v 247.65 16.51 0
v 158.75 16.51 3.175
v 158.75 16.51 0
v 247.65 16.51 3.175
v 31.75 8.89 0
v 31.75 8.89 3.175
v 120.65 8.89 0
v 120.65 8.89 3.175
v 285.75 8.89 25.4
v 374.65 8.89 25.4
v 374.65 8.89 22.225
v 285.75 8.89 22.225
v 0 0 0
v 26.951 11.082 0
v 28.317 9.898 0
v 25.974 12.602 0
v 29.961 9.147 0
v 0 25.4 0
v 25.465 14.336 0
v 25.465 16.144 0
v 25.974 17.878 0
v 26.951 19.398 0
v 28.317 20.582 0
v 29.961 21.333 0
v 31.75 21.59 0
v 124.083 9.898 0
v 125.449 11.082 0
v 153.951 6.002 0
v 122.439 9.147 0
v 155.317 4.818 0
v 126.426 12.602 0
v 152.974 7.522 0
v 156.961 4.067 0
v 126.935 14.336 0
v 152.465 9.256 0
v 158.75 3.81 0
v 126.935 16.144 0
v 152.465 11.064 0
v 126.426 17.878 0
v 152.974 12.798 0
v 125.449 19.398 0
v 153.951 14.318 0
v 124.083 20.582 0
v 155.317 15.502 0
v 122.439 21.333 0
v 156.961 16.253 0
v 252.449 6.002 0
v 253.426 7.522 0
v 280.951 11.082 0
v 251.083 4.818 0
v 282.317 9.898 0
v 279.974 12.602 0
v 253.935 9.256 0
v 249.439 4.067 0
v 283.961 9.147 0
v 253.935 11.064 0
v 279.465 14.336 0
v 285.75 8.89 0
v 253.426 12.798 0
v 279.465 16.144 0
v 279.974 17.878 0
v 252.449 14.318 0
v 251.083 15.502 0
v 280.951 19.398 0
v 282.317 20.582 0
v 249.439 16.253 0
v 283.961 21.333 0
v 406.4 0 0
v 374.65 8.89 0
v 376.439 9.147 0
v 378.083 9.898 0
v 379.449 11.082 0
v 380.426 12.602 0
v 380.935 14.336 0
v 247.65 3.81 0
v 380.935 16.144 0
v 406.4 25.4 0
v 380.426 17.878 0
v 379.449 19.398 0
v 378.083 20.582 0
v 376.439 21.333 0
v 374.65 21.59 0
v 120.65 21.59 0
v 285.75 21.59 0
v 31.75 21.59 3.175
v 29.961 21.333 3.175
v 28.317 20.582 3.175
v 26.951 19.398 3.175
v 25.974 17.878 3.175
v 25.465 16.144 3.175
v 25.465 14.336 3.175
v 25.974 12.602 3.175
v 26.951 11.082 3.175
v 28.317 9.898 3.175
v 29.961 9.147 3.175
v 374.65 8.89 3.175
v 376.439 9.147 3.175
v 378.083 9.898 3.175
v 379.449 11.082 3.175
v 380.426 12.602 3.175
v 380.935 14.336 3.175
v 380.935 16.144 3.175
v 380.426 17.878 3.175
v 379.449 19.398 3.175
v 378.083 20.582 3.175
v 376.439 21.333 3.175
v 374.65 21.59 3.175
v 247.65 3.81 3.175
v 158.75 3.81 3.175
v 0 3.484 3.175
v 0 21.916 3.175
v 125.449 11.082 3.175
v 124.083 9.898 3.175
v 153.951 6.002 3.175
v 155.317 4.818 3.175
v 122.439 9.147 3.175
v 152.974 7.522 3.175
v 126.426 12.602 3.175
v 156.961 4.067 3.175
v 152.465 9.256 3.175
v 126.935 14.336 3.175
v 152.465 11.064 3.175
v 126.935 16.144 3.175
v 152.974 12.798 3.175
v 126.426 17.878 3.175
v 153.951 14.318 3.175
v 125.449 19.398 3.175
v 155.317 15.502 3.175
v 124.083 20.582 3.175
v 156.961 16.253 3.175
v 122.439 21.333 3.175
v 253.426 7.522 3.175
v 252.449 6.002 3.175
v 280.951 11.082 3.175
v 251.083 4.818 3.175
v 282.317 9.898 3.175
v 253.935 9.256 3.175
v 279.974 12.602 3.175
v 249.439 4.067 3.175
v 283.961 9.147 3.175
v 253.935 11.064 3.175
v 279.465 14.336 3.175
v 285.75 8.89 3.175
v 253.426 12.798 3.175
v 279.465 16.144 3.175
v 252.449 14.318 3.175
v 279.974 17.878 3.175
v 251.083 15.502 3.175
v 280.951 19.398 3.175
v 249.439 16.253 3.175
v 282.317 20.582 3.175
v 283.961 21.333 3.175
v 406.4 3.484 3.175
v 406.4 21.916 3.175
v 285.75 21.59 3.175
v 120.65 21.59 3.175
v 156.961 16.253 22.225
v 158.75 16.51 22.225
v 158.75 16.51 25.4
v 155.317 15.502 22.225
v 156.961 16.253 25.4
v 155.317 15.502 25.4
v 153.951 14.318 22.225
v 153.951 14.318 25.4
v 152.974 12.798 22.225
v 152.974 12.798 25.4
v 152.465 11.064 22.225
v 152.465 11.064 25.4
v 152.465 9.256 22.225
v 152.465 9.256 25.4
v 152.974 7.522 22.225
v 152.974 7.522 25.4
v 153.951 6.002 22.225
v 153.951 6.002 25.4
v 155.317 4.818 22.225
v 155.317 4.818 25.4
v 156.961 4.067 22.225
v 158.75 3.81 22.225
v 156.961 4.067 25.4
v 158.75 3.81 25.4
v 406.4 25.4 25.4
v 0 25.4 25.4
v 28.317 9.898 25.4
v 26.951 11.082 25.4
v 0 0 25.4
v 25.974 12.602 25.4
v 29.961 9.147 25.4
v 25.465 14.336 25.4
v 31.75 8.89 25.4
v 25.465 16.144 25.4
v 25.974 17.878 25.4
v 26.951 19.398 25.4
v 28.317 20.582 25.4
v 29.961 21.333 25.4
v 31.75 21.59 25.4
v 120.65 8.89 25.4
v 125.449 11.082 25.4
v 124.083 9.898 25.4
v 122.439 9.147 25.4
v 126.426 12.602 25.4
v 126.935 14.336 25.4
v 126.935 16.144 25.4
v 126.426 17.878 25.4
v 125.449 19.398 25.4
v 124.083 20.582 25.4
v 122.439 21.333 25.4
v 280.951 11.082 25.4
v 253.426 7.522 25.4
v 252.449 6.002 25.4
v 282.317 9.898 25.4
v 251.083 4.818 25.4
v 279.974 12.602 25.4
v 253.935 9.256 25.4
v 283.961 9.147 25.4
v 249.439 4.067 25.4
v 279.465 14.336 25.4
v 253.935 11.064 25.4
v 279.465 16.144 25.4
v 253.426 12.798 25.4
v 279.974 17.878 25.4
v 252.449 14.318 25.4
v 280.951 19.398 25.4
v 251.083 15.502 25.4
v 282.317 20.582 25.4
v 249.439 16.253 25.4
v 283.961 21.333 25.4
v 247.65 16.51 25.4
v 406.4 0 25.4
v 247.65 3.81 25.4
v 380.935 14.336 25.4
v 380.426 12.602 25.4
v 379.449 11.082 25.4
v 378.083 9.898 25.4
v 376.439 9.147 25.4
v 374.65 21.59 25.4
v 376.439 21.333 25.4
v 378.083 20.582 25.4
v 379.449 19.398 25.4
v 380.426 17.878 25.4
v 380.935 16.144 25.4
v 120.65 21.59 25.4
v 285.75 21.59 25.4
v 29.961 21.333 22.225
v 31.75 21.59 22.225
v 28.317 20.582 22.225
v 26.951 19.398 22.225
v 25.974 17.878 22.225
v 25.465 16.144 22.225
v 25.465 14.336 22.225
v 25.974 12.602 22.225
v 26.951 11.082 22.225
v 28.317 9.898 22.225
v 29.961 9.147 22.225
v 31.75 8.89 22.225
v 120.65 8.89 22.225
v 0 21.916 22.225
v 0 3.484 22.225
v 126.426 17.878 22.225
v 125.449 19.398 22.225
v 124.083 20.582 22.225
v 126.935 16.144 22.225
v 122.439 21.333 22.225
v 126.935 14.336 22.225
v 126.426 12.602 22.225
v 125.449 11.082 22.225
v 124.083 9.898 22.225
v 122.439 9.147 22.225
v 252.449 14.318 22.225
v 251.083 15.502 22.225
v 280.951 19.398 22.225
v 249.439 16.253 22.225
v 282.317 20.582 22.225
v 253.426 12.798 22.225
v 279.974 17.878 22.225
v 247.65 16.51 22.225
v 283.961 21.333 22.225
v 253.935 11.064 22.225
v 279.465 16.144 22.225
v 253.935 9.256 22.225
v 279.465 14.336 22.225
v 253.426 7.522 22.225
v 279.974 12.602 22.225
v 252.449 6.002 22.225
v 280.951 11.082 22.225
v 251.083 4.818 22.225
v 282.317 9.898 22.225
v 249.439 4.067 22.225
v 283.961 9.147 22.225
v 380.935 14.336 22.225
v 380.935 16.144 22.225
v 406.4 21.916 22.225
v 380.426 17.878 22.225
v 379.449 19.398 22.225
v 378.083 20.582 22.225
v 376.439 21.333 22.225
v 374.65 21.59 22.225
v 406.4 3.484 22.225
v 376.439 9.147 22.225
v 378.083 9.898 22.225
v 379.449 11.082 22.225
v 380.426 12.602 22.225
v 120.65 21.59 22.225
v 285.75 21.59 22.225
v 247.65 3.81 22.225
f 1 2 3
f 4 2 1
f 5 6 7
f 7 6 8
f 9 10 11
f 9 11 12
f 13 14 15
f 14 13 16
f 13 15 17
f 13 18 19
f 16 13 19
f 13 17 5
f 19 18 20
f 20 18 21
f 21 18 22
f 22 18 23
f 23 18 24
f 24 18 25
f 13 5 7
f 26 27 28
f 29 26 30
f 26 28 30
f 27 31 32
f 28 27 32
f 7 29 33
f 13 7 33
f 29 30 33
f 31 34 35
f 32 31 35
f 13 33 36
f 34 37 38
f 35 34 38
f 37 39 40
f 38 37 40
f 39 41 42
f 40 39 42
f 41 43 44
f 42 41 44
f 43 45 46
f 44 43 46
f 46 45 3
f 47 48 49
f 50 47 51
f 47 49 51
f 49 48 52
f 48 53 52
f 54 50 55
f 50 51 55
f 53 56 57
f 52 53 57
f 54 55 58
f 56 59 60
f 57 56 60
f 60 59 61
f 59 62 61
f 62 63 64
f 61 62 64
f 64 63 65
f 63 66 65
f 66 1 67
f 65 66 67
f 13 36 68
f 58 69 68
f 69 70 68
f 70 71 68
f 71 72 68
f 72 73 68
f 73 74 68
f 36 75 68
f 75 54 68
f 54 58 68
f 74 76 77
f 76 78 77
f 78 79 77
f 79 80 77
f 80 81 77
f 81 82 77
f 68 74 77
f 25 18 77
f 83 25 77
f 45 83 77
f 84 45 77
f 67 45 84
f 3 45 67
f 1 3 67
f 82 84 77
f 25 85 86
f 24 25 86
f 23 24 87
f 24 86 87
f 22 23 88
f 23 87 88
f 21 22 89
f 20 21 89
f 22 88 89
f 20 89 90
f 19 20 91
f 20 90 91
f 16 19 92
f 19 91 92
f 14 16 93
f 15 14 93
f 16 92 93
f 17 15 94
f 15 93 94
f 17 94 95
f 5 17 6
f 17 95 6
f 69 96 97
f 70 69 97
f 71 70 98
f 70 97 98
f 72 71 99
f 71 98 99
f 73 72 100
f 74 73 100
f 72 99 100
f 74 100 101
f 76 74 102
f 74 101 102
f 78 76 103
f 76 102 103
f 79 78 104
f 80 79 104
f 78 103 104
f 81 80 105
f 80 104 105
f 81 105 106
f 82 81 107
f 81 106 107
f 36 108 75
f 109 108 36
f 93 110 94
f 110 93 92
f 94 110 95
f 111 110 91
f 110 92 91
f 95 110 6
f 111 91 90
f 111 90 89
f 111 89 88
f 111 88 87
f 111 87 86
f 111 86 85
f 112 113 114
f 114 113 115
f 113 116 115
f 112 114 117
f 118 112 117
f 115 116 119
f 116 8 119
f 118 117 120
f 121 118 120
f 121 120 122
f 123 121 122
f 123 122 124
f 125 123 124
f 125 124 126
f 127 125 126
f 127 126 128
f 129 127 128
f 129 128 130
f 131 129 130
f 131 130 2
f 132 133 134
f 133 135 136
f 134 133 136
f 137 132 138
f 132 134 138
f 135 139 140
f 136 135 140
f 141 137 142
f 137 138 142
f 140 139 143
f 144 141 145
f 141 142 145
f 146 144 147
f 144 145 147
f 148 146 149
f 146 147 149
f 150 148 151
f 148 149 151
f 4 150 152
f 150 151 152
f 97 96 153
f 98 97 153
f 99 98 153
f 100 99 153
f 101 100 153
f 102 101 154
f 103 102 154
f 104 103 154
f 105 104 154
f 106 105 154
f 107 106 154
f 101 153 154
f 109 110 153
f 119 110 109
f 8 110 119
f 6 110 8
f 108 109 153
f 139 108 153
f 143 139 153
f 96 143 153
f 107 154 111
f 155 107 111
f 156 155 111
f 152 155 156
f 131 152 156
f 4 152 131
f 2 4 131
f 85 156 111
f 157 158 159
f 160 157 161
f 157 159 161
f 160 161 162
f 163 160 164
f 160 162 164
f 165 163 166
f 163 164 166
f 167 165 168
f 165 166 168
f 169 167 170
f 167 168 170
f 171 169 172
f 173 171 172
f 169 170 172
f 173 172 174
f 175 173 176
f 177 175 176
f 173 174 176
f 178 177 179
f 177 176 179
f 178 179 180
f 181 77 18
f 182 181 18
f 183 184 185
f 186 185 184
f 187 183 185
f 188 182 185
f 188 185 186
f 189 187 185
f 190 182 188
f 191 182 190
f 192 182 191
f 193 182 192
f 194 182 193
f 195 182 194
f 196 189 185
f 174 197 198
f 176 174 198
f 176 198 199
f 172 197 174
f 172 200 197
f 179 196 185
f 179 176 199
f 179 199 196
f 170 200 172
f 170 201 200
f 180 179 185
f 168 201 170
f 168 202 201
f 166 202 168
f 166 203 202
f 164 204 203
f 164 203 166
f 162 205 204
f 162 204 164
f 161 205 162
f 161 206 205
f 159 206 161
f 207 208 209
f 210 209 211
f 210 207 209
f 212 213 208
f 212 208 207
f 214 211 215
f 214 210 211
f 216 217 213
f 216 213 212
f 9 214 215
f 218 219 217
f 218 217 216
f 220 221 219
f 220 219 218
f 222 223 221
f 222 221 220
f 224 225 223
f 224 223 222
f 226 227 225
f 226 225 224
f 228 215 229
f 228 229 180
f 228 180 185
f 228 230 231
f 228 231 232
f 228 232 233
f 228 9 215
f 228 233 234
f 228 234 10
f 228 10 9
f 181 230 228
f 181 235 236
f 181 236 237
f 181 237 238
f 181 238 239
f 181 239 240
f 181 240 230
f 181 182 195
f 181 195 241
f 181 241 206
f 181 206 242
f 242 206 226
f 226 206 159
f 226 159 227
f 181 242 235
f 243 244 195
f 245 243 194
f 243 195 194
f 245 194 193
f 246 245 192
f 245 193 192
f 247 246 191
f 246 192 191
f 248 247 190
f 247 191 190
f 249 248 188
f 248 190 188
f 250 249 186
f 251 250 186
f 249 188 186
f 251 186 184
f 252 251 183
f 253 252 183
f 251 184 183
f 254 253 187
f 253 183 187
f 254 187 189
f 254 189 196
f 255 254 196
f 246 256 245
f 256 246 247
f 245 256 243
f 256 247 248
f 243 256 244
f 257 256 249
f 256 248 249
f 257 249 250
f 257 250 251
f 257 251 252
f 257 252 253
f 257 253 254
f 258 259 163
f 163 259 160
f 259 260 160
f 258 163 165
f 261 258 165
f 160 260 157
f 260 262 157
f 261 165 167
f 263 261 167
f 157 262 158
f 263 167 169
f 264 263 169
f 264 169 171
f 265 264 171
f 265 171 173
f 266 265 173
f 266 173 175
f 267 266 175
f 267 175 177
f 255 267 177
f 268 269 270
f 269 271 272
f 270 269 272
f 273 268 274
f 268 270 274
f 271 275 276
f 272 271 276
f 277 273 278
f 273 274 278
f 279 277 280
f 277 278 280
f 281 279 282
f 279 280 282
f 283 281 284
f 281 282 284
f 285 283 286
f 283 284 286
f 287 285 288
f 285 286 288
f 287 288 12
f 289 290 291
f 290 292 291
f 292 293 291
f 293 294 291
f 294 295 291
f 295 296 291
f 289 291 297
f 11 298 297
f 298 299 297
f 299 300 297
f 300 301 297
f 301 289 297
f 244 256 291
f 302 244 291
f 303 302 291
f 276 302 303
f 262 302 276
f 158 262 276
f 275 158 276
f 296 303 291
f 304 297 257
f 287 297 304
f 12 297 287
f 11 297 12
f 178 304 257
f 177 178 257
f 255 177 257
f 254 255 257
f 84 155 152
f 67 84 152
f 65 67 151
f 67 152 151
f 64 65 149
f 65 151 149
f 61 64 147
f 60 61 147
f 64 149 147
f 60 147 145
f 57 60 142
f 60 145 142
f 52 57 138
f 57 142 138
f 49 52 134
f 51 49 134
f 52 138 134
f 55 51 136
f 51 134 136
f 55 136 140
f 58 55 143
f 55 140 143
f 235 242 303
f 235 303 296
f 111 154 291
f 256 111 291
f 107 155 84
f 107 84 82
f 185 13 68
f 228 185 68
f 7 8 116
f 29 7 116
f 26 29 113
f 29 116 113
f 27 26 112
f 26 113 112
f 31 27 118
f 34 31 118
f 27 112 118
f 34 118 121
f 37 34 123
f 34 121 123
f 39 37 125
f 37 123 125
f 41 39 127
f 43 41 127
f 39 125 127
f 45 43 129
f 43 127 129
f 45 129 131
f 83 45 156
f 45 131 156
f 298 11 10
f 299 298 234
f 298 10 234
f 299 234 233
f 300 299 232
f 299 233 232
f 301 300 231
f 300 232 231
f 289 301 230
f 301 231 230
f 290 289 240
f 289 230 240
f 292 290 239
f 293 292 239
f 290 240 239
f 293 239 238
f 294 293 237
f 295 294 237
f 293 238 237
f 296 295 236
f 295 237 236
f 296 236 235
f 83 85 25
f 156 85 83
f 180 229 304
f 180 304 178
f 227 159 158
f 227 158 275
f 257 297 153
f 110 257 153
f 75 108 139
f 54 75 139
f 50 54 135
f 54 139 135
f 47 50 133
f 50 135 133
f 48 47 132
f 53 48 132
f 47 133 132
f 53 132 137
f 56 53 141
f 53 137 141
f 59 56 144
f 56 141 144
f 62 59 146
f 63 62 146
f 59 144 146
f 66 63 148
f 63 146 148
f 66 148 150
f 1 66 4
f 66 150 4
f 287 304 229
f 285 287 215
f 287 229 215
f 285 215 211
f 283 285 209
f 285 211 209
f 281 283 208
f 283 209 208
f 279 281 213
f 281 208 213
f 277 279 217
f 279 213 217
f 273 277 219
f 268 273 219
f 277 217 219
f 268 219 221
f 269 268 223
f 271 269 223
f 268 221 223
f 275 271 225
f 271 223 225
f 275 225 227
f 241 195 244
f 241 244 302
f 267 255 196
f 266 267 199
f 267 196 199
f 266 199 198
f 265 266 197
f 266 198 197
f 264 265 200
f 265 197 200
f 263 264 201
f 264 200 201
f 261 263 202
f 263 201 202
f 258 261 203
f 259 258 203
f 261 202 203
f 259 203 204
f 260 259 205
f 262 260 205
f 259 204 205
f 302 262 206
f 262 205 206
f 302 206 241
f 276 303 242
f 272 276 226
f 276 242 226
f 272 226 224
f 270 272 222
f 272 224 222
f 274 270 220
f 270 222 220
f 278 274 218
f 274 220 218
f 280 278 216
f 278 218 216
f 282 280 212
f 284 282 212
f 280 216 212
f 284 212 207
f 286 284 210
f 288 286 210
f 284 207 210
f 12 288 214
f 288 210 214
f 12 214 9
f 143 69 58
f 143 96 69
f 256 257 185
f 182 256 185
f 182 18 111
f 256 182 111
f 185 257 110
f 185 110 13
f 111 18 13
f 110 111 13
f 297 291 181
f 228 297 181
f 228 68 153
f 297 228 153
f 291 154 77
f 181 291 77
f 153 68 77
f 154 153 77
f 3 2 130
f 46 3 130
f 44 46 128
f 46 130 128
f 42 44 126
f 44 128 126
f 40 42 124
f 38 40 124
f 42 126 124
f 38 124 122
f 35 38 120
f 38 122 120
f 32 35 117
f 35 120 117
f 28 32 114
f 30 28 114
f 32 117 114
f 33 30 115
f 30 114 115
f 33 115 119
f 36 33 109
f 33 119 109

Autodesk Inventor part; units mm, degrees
ref_plane "YZ Plane" through (0, 0, 0) normal (1, 0, 0) x (0, 1, 0)
ref_plane "XZ Plane" through (0, 0, 0) normal (0, 1, 0) x (-1, 0, 0)
ref_plane "XY Plane" through (0, 0, 0) normal (0, 0, 1) x (1, 0, 0)
sketch "Sketch1" plane through (0, 0, 0) normal (0, 0, 1) x (1, 0, 0)
  line L0 (0, 0) -> (406.4, 0)
  line L1 (406.4, 0) -> (406.4, 25.4)
  line L2 (406.4, 25.4) -> (0, 25.4)
  line L3 (0, 25.4) -> (0, 0)
  dimension "d0" = 406.4
  dimension "d1" = 25.4
extrude "Extrusion1" add sketch "Sketch1" along normal blind 25.4
sketch "Sketch2" plane through (406.4, 0, 0) normal (1, 0, 0) x (0, 0, -1)
  line L0 (-22.225, 3.4845) -> (-3.175, 3.4845)
  line L1 (-3.175, 3.4845) -> (-3.175, 21.9155)
  line L2 (-3.175, 21.9155) -> (-22.225, 21.9155)
  line L3 (-22.225, 21.9155) -> (-22.225, 3.4845)
  line L4 (-22.225, 3.4845) -> (-3.175, 21.9155) construction
  line L5 (-3.175, 3.4845) -> (-22.225, 21.9155) construction
  point P0 (-12.7, 12.7)
  dimension "d4" = 19.05
extrude "Extrusion2" cut sketch "Sketch2" against normal blind 406.4
sketch "Sketch3" plane through (0, 0, 25.4) normal (0, 0, 1) x (1, 0, 0)
  arc A0 (31.75, 21.59) -> (31.75, 8.89) centre (31.75, 15.24) ccw
  arc A1 (120.65, 8.89) -> (120.65, 21.59) centre (120.65, 15.24) ccw
  line L0 (31.75, 21.59) -> (120.65, 21.59)
  line L1 (31.75, 8.89) -> (120.65, 8.89)
  arc A2 (158.75, 16.51) -> (158.75, 3.81) centre (158.75, 10.16) ccw
  arc A3 (247.65, 3.81) -> (247.65, 16.51) centre (247.65, 10.16) ccw
  line L2 (158.75, 16.51) -> (247.65, 16.51)
  line L3 (247.65, 3.81) -> (158.75, 3.81)
  line L4 (0, 0) -> (406.4, 0) projected
  line L5 (406.4, 25.4) -> (0, 25.4) projected
  line L6 (0, 25.4) -> (0, 0) projected
  line L7 (25.4, 15.24) -> (25.4, 25.4)
  line L8 (127, 15.24) -> (127, 25.4)
  line L9 (152.4, 10.16) -> (152.4, 0)
  line L10 (254, 10.16) -> (254, 0)
  arc A4 (285.75, 21.59) -> (285.75, 8.89) centre (285.75, 15.24) ccw
  arc A5 (374.65, 8.89) -> (374.65, 21.59) centre (374.65, 15.24) ccw
  line L11 (279.4, 15.24) -> (279.4, 25.4)
  line L12 (285.75, 21.59) -> (374.65, 21.59)
  line L13 (381, 15.24) -> (381, 25.4)
  line L14 (374.65, 8.89) -> (285.75, 8.89)
  line L15 (158.75, 0) -> (158.75, 10.16)
  line L16 (31.75, 15.24) -> (31.75, 25.4)
  line L17 (374.65, 15.24) -> (374.65, 25.4)
  dimension "d7" = 12.7
  dimension "d8" = 12.7
  dimension "d13" = 12.7
  dimension "d14" = 12.7
  dimension "d19" = 101.6
  dimension "d20" = 101.6
  dimension "d22" = 12.7
  dimension "d23" = 12.7
  dimension "d24" = 101.6
  dimension "d25" = 25.4
  dimension "d26" = 25.4
  dimension "d27" = 25.4
  dimension "d28" = 10.16
  dimension "d29" = 10.16
extrude "Extrusion3" cut sketch "Sketch3" against normal blind 25.4 contours L0 A1 L1 A0 | A4 L12 A5 L14 | A2 L2 A3 L3
properties part number "West Coast Side"
